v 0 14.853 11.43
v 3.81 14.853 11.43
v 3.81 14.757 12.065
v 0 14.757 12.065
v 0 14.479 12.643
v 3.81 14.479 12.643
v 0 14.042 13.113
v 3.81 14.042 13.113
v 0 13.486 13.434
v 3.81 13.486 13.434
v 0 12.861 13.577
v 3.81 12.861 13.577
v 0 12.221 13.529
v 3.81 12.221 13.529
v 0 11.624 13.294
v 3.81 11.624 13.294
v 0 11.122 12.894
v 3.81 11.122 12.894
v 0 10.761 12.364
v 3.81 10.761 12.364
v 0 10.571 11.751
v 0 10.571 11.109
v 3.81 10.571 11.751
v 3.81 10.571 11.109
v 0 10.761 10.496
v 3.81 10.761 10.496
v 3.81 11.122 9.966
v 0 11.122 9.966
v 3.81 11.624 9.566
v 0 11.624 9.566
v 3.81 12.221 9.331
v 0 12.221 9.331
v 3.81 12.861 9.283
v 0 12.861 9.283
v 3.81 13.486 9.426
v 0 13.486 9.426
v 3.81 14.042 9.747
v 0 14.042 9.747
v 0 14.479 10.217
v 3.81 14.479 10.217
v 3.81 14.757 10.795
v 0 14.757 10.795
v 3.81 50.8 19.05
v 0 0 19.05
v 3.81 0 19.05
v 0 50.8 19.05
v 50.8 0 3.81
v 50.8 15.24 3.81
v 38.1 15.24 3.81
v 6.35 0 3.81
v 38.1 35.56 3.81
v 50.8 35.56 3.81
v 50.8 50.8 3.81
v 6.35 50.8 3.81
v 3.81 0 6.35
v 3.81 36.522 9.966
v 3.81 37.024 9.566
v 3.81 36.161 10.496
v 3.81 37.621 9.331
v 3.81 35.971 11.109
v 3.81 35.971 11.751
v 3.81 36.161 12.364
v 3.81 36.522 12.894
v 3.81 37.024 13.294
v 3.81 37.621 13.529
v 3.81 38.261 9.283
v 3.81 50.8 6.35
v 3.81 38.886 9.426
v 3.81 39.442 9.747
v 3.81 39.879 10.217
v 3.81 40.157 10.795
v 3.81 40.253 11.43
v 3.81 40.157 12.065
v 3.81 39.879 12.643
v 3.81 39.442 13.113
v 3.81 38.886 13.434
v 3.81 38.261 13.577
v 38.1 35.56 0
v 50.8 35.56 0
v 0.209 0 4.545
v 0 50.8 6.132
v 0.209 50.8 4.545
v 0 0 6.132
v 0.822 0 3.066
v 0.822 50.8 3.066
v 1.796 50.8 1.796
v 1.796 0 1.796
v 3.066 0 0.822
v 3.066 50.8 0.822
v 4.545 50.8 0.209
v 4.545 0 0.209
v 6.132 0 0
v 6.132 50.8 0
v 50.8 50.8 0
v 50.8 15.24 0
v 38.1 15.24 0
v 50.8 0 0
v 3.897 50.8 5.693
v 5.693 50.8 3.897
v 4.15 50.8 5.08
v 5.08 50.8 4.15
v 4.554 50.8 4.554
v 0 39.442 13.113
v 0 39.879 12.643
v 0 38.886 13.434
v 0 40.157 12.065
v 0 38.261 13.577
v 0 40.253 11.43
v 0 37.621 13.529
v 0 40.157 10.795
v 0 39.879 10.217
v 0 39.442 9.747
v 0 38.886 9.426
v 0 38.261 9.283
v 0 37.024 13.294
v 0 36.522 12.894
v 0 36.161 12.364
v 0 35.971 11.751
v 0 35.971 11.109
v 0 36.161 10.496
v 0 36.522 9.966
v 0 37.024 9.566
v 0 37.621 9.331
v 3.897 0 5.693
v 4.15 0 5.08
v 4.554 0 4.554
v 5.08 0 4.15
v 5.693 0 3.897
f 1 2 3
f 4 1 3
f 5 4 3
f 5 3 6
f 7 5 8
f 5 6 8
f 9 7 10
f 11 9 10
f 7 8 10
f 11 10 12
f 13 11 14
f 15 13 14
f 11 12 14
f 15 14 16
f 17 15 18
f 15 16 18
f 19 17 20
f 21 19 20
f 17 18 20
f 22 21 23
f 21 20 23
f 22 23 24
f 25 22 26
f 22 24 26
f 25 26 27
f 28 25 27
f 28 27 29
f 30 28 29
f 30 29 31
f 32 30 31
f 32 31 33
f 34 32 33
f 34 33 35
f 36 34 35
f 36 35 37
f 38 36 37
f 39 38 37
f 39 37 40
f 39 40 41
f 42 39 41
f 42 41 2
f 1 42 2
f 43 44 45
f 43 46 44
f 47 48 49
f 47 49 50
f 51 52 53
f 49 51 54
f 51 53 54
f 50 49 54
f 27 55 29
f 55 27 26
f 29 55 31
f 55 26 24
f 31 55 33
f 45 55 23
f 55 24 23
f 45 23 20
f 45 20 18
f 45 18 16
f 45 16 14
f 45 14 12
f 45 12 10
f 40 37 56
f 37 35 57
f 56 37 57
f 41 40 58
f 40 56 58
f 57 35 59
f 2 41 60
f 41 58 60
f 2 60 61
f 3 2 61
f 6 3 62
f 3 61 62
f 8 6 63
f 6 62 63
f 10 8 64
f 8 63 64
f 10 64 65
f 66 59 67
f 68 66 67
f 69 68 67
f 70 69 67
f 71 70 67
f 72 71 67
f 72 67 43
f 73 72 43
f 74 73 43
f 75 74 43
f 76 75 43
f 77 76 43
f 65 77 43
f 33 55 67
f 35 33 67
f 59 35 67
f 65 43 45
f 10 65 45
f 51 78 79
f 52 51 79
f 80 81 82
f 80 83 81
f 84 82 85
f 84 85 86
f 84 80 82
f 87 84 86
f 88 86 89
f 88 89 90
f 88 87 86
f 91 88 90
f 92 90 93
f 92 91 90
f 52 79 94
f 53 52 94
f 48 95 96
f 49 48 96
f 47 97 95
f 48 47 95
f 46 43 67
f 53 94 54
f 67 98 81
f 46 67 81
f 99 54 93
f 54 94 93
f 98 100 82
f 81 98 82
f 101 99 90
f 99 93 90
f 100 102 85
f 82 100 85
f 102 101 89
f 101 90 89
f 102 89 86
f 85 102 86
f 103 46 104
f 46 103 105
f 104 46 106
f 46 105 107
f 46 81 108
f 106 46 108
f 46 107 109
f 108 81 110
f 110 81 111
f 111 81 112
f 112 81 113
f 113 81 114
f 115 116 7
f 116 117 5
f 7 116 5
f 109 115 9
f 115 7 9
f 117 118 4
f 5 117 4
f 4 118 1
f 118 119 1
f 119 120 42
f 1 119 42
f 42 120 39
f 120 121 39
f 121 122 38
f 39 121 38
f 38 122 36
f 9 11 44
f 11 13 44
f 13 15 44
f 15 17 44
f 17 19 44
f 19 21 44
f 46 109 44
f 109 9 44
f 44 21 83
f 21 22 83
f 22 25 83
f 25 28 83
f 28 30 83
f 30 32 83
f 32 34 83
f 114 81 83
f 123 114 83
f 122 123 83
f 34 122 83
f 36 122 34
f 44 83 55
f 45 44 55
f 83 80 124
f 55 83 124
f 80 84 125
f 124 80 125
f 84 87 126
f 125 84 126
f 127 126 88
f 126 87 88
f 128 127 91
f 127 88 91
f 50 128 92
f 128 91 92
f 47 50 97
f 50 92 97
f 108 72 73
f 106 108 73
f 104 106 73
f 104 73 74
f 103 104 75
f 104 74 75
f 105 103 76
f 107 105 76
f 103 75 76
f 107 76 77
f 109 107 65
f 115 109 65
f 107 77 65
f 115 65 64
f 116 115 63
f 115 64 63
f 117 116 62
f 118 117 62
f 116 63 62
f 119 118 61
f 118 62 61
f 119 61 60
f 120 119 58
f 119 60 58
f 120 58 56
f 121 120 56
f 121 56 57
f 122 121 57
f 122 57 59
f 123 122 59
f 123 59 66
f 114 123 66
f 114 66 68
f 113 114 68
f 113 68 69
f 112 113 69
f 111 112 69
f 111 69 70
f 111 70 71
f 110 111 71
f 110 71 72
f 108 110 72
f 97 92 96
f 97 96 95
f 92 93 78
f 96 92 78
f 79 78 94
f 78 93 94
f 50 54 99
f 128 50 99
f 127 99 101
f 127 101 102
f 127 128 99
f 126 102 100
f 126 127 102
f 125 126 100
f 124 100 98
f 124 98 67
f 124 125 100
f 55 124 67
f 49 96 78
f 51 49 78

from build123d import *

# Parameters (mm, degrees)
F1_DEPTH = 19.05
F2_W     = 46.99
F2_H     = 15.24
F3_DEPTH = 50.801
F4_R     = 2.15265
F5_DEPTH = 3.811
F6_R     = 2.54
F7_R     = 6.132068


with BuildPart() as f1:
    # F0 (on Top) → F1 (new body)
    with BuildSketch(Plane.XY):
        Polygon((38.1, 15.24), (38.1, 35.56), (50.8, 35.56), (50.8, 50.8), (0, 50.8), (0, 0), (50.8, 0), (50.8, 15.24), align=None)
    extrude(amount=F1_DEPTH)

    # F2 (on face) → F3 (cut, through all)
    with BuildSketch(Plane(origin=(0, 50.8, 0), x_dir=(-1, 0, 0), z_dir=(0, 1, 0))):
        with Locations((-27.305, 11.43)):
            Rectangle(F2_W, F2_H)
    extrude(amount=-F3_DEPTH, mode=Mode.SUBTRACT)

    # F4 (on face) → F5 (cut, through all)
    with BuildSketch(Plane.YZ.offset(3.81)):
        with Locations((38.1, 11.43)):
            Circle(F4_R)
        with Locations((12.7, 11.43)):
            Circle(F4_R)
    extrude(amount=-F5_DEPTH, mode=Mode.SUBTRACT)

    # F6
    f6_edges = [f1.edges().sort_by_distance(p)[0] for p in [
        (3.81, 25.4, 3.81),
    ]]
    fillet(f6_edges, radius=F6_R)

    # F7
    f7_edges = [f1.edges().sort_by_distance(p)[0] for p in [
        (0, 25.4, 0),
    ]]
    fillet(f7_edges, radius=F7_R)


solid = f1.part
